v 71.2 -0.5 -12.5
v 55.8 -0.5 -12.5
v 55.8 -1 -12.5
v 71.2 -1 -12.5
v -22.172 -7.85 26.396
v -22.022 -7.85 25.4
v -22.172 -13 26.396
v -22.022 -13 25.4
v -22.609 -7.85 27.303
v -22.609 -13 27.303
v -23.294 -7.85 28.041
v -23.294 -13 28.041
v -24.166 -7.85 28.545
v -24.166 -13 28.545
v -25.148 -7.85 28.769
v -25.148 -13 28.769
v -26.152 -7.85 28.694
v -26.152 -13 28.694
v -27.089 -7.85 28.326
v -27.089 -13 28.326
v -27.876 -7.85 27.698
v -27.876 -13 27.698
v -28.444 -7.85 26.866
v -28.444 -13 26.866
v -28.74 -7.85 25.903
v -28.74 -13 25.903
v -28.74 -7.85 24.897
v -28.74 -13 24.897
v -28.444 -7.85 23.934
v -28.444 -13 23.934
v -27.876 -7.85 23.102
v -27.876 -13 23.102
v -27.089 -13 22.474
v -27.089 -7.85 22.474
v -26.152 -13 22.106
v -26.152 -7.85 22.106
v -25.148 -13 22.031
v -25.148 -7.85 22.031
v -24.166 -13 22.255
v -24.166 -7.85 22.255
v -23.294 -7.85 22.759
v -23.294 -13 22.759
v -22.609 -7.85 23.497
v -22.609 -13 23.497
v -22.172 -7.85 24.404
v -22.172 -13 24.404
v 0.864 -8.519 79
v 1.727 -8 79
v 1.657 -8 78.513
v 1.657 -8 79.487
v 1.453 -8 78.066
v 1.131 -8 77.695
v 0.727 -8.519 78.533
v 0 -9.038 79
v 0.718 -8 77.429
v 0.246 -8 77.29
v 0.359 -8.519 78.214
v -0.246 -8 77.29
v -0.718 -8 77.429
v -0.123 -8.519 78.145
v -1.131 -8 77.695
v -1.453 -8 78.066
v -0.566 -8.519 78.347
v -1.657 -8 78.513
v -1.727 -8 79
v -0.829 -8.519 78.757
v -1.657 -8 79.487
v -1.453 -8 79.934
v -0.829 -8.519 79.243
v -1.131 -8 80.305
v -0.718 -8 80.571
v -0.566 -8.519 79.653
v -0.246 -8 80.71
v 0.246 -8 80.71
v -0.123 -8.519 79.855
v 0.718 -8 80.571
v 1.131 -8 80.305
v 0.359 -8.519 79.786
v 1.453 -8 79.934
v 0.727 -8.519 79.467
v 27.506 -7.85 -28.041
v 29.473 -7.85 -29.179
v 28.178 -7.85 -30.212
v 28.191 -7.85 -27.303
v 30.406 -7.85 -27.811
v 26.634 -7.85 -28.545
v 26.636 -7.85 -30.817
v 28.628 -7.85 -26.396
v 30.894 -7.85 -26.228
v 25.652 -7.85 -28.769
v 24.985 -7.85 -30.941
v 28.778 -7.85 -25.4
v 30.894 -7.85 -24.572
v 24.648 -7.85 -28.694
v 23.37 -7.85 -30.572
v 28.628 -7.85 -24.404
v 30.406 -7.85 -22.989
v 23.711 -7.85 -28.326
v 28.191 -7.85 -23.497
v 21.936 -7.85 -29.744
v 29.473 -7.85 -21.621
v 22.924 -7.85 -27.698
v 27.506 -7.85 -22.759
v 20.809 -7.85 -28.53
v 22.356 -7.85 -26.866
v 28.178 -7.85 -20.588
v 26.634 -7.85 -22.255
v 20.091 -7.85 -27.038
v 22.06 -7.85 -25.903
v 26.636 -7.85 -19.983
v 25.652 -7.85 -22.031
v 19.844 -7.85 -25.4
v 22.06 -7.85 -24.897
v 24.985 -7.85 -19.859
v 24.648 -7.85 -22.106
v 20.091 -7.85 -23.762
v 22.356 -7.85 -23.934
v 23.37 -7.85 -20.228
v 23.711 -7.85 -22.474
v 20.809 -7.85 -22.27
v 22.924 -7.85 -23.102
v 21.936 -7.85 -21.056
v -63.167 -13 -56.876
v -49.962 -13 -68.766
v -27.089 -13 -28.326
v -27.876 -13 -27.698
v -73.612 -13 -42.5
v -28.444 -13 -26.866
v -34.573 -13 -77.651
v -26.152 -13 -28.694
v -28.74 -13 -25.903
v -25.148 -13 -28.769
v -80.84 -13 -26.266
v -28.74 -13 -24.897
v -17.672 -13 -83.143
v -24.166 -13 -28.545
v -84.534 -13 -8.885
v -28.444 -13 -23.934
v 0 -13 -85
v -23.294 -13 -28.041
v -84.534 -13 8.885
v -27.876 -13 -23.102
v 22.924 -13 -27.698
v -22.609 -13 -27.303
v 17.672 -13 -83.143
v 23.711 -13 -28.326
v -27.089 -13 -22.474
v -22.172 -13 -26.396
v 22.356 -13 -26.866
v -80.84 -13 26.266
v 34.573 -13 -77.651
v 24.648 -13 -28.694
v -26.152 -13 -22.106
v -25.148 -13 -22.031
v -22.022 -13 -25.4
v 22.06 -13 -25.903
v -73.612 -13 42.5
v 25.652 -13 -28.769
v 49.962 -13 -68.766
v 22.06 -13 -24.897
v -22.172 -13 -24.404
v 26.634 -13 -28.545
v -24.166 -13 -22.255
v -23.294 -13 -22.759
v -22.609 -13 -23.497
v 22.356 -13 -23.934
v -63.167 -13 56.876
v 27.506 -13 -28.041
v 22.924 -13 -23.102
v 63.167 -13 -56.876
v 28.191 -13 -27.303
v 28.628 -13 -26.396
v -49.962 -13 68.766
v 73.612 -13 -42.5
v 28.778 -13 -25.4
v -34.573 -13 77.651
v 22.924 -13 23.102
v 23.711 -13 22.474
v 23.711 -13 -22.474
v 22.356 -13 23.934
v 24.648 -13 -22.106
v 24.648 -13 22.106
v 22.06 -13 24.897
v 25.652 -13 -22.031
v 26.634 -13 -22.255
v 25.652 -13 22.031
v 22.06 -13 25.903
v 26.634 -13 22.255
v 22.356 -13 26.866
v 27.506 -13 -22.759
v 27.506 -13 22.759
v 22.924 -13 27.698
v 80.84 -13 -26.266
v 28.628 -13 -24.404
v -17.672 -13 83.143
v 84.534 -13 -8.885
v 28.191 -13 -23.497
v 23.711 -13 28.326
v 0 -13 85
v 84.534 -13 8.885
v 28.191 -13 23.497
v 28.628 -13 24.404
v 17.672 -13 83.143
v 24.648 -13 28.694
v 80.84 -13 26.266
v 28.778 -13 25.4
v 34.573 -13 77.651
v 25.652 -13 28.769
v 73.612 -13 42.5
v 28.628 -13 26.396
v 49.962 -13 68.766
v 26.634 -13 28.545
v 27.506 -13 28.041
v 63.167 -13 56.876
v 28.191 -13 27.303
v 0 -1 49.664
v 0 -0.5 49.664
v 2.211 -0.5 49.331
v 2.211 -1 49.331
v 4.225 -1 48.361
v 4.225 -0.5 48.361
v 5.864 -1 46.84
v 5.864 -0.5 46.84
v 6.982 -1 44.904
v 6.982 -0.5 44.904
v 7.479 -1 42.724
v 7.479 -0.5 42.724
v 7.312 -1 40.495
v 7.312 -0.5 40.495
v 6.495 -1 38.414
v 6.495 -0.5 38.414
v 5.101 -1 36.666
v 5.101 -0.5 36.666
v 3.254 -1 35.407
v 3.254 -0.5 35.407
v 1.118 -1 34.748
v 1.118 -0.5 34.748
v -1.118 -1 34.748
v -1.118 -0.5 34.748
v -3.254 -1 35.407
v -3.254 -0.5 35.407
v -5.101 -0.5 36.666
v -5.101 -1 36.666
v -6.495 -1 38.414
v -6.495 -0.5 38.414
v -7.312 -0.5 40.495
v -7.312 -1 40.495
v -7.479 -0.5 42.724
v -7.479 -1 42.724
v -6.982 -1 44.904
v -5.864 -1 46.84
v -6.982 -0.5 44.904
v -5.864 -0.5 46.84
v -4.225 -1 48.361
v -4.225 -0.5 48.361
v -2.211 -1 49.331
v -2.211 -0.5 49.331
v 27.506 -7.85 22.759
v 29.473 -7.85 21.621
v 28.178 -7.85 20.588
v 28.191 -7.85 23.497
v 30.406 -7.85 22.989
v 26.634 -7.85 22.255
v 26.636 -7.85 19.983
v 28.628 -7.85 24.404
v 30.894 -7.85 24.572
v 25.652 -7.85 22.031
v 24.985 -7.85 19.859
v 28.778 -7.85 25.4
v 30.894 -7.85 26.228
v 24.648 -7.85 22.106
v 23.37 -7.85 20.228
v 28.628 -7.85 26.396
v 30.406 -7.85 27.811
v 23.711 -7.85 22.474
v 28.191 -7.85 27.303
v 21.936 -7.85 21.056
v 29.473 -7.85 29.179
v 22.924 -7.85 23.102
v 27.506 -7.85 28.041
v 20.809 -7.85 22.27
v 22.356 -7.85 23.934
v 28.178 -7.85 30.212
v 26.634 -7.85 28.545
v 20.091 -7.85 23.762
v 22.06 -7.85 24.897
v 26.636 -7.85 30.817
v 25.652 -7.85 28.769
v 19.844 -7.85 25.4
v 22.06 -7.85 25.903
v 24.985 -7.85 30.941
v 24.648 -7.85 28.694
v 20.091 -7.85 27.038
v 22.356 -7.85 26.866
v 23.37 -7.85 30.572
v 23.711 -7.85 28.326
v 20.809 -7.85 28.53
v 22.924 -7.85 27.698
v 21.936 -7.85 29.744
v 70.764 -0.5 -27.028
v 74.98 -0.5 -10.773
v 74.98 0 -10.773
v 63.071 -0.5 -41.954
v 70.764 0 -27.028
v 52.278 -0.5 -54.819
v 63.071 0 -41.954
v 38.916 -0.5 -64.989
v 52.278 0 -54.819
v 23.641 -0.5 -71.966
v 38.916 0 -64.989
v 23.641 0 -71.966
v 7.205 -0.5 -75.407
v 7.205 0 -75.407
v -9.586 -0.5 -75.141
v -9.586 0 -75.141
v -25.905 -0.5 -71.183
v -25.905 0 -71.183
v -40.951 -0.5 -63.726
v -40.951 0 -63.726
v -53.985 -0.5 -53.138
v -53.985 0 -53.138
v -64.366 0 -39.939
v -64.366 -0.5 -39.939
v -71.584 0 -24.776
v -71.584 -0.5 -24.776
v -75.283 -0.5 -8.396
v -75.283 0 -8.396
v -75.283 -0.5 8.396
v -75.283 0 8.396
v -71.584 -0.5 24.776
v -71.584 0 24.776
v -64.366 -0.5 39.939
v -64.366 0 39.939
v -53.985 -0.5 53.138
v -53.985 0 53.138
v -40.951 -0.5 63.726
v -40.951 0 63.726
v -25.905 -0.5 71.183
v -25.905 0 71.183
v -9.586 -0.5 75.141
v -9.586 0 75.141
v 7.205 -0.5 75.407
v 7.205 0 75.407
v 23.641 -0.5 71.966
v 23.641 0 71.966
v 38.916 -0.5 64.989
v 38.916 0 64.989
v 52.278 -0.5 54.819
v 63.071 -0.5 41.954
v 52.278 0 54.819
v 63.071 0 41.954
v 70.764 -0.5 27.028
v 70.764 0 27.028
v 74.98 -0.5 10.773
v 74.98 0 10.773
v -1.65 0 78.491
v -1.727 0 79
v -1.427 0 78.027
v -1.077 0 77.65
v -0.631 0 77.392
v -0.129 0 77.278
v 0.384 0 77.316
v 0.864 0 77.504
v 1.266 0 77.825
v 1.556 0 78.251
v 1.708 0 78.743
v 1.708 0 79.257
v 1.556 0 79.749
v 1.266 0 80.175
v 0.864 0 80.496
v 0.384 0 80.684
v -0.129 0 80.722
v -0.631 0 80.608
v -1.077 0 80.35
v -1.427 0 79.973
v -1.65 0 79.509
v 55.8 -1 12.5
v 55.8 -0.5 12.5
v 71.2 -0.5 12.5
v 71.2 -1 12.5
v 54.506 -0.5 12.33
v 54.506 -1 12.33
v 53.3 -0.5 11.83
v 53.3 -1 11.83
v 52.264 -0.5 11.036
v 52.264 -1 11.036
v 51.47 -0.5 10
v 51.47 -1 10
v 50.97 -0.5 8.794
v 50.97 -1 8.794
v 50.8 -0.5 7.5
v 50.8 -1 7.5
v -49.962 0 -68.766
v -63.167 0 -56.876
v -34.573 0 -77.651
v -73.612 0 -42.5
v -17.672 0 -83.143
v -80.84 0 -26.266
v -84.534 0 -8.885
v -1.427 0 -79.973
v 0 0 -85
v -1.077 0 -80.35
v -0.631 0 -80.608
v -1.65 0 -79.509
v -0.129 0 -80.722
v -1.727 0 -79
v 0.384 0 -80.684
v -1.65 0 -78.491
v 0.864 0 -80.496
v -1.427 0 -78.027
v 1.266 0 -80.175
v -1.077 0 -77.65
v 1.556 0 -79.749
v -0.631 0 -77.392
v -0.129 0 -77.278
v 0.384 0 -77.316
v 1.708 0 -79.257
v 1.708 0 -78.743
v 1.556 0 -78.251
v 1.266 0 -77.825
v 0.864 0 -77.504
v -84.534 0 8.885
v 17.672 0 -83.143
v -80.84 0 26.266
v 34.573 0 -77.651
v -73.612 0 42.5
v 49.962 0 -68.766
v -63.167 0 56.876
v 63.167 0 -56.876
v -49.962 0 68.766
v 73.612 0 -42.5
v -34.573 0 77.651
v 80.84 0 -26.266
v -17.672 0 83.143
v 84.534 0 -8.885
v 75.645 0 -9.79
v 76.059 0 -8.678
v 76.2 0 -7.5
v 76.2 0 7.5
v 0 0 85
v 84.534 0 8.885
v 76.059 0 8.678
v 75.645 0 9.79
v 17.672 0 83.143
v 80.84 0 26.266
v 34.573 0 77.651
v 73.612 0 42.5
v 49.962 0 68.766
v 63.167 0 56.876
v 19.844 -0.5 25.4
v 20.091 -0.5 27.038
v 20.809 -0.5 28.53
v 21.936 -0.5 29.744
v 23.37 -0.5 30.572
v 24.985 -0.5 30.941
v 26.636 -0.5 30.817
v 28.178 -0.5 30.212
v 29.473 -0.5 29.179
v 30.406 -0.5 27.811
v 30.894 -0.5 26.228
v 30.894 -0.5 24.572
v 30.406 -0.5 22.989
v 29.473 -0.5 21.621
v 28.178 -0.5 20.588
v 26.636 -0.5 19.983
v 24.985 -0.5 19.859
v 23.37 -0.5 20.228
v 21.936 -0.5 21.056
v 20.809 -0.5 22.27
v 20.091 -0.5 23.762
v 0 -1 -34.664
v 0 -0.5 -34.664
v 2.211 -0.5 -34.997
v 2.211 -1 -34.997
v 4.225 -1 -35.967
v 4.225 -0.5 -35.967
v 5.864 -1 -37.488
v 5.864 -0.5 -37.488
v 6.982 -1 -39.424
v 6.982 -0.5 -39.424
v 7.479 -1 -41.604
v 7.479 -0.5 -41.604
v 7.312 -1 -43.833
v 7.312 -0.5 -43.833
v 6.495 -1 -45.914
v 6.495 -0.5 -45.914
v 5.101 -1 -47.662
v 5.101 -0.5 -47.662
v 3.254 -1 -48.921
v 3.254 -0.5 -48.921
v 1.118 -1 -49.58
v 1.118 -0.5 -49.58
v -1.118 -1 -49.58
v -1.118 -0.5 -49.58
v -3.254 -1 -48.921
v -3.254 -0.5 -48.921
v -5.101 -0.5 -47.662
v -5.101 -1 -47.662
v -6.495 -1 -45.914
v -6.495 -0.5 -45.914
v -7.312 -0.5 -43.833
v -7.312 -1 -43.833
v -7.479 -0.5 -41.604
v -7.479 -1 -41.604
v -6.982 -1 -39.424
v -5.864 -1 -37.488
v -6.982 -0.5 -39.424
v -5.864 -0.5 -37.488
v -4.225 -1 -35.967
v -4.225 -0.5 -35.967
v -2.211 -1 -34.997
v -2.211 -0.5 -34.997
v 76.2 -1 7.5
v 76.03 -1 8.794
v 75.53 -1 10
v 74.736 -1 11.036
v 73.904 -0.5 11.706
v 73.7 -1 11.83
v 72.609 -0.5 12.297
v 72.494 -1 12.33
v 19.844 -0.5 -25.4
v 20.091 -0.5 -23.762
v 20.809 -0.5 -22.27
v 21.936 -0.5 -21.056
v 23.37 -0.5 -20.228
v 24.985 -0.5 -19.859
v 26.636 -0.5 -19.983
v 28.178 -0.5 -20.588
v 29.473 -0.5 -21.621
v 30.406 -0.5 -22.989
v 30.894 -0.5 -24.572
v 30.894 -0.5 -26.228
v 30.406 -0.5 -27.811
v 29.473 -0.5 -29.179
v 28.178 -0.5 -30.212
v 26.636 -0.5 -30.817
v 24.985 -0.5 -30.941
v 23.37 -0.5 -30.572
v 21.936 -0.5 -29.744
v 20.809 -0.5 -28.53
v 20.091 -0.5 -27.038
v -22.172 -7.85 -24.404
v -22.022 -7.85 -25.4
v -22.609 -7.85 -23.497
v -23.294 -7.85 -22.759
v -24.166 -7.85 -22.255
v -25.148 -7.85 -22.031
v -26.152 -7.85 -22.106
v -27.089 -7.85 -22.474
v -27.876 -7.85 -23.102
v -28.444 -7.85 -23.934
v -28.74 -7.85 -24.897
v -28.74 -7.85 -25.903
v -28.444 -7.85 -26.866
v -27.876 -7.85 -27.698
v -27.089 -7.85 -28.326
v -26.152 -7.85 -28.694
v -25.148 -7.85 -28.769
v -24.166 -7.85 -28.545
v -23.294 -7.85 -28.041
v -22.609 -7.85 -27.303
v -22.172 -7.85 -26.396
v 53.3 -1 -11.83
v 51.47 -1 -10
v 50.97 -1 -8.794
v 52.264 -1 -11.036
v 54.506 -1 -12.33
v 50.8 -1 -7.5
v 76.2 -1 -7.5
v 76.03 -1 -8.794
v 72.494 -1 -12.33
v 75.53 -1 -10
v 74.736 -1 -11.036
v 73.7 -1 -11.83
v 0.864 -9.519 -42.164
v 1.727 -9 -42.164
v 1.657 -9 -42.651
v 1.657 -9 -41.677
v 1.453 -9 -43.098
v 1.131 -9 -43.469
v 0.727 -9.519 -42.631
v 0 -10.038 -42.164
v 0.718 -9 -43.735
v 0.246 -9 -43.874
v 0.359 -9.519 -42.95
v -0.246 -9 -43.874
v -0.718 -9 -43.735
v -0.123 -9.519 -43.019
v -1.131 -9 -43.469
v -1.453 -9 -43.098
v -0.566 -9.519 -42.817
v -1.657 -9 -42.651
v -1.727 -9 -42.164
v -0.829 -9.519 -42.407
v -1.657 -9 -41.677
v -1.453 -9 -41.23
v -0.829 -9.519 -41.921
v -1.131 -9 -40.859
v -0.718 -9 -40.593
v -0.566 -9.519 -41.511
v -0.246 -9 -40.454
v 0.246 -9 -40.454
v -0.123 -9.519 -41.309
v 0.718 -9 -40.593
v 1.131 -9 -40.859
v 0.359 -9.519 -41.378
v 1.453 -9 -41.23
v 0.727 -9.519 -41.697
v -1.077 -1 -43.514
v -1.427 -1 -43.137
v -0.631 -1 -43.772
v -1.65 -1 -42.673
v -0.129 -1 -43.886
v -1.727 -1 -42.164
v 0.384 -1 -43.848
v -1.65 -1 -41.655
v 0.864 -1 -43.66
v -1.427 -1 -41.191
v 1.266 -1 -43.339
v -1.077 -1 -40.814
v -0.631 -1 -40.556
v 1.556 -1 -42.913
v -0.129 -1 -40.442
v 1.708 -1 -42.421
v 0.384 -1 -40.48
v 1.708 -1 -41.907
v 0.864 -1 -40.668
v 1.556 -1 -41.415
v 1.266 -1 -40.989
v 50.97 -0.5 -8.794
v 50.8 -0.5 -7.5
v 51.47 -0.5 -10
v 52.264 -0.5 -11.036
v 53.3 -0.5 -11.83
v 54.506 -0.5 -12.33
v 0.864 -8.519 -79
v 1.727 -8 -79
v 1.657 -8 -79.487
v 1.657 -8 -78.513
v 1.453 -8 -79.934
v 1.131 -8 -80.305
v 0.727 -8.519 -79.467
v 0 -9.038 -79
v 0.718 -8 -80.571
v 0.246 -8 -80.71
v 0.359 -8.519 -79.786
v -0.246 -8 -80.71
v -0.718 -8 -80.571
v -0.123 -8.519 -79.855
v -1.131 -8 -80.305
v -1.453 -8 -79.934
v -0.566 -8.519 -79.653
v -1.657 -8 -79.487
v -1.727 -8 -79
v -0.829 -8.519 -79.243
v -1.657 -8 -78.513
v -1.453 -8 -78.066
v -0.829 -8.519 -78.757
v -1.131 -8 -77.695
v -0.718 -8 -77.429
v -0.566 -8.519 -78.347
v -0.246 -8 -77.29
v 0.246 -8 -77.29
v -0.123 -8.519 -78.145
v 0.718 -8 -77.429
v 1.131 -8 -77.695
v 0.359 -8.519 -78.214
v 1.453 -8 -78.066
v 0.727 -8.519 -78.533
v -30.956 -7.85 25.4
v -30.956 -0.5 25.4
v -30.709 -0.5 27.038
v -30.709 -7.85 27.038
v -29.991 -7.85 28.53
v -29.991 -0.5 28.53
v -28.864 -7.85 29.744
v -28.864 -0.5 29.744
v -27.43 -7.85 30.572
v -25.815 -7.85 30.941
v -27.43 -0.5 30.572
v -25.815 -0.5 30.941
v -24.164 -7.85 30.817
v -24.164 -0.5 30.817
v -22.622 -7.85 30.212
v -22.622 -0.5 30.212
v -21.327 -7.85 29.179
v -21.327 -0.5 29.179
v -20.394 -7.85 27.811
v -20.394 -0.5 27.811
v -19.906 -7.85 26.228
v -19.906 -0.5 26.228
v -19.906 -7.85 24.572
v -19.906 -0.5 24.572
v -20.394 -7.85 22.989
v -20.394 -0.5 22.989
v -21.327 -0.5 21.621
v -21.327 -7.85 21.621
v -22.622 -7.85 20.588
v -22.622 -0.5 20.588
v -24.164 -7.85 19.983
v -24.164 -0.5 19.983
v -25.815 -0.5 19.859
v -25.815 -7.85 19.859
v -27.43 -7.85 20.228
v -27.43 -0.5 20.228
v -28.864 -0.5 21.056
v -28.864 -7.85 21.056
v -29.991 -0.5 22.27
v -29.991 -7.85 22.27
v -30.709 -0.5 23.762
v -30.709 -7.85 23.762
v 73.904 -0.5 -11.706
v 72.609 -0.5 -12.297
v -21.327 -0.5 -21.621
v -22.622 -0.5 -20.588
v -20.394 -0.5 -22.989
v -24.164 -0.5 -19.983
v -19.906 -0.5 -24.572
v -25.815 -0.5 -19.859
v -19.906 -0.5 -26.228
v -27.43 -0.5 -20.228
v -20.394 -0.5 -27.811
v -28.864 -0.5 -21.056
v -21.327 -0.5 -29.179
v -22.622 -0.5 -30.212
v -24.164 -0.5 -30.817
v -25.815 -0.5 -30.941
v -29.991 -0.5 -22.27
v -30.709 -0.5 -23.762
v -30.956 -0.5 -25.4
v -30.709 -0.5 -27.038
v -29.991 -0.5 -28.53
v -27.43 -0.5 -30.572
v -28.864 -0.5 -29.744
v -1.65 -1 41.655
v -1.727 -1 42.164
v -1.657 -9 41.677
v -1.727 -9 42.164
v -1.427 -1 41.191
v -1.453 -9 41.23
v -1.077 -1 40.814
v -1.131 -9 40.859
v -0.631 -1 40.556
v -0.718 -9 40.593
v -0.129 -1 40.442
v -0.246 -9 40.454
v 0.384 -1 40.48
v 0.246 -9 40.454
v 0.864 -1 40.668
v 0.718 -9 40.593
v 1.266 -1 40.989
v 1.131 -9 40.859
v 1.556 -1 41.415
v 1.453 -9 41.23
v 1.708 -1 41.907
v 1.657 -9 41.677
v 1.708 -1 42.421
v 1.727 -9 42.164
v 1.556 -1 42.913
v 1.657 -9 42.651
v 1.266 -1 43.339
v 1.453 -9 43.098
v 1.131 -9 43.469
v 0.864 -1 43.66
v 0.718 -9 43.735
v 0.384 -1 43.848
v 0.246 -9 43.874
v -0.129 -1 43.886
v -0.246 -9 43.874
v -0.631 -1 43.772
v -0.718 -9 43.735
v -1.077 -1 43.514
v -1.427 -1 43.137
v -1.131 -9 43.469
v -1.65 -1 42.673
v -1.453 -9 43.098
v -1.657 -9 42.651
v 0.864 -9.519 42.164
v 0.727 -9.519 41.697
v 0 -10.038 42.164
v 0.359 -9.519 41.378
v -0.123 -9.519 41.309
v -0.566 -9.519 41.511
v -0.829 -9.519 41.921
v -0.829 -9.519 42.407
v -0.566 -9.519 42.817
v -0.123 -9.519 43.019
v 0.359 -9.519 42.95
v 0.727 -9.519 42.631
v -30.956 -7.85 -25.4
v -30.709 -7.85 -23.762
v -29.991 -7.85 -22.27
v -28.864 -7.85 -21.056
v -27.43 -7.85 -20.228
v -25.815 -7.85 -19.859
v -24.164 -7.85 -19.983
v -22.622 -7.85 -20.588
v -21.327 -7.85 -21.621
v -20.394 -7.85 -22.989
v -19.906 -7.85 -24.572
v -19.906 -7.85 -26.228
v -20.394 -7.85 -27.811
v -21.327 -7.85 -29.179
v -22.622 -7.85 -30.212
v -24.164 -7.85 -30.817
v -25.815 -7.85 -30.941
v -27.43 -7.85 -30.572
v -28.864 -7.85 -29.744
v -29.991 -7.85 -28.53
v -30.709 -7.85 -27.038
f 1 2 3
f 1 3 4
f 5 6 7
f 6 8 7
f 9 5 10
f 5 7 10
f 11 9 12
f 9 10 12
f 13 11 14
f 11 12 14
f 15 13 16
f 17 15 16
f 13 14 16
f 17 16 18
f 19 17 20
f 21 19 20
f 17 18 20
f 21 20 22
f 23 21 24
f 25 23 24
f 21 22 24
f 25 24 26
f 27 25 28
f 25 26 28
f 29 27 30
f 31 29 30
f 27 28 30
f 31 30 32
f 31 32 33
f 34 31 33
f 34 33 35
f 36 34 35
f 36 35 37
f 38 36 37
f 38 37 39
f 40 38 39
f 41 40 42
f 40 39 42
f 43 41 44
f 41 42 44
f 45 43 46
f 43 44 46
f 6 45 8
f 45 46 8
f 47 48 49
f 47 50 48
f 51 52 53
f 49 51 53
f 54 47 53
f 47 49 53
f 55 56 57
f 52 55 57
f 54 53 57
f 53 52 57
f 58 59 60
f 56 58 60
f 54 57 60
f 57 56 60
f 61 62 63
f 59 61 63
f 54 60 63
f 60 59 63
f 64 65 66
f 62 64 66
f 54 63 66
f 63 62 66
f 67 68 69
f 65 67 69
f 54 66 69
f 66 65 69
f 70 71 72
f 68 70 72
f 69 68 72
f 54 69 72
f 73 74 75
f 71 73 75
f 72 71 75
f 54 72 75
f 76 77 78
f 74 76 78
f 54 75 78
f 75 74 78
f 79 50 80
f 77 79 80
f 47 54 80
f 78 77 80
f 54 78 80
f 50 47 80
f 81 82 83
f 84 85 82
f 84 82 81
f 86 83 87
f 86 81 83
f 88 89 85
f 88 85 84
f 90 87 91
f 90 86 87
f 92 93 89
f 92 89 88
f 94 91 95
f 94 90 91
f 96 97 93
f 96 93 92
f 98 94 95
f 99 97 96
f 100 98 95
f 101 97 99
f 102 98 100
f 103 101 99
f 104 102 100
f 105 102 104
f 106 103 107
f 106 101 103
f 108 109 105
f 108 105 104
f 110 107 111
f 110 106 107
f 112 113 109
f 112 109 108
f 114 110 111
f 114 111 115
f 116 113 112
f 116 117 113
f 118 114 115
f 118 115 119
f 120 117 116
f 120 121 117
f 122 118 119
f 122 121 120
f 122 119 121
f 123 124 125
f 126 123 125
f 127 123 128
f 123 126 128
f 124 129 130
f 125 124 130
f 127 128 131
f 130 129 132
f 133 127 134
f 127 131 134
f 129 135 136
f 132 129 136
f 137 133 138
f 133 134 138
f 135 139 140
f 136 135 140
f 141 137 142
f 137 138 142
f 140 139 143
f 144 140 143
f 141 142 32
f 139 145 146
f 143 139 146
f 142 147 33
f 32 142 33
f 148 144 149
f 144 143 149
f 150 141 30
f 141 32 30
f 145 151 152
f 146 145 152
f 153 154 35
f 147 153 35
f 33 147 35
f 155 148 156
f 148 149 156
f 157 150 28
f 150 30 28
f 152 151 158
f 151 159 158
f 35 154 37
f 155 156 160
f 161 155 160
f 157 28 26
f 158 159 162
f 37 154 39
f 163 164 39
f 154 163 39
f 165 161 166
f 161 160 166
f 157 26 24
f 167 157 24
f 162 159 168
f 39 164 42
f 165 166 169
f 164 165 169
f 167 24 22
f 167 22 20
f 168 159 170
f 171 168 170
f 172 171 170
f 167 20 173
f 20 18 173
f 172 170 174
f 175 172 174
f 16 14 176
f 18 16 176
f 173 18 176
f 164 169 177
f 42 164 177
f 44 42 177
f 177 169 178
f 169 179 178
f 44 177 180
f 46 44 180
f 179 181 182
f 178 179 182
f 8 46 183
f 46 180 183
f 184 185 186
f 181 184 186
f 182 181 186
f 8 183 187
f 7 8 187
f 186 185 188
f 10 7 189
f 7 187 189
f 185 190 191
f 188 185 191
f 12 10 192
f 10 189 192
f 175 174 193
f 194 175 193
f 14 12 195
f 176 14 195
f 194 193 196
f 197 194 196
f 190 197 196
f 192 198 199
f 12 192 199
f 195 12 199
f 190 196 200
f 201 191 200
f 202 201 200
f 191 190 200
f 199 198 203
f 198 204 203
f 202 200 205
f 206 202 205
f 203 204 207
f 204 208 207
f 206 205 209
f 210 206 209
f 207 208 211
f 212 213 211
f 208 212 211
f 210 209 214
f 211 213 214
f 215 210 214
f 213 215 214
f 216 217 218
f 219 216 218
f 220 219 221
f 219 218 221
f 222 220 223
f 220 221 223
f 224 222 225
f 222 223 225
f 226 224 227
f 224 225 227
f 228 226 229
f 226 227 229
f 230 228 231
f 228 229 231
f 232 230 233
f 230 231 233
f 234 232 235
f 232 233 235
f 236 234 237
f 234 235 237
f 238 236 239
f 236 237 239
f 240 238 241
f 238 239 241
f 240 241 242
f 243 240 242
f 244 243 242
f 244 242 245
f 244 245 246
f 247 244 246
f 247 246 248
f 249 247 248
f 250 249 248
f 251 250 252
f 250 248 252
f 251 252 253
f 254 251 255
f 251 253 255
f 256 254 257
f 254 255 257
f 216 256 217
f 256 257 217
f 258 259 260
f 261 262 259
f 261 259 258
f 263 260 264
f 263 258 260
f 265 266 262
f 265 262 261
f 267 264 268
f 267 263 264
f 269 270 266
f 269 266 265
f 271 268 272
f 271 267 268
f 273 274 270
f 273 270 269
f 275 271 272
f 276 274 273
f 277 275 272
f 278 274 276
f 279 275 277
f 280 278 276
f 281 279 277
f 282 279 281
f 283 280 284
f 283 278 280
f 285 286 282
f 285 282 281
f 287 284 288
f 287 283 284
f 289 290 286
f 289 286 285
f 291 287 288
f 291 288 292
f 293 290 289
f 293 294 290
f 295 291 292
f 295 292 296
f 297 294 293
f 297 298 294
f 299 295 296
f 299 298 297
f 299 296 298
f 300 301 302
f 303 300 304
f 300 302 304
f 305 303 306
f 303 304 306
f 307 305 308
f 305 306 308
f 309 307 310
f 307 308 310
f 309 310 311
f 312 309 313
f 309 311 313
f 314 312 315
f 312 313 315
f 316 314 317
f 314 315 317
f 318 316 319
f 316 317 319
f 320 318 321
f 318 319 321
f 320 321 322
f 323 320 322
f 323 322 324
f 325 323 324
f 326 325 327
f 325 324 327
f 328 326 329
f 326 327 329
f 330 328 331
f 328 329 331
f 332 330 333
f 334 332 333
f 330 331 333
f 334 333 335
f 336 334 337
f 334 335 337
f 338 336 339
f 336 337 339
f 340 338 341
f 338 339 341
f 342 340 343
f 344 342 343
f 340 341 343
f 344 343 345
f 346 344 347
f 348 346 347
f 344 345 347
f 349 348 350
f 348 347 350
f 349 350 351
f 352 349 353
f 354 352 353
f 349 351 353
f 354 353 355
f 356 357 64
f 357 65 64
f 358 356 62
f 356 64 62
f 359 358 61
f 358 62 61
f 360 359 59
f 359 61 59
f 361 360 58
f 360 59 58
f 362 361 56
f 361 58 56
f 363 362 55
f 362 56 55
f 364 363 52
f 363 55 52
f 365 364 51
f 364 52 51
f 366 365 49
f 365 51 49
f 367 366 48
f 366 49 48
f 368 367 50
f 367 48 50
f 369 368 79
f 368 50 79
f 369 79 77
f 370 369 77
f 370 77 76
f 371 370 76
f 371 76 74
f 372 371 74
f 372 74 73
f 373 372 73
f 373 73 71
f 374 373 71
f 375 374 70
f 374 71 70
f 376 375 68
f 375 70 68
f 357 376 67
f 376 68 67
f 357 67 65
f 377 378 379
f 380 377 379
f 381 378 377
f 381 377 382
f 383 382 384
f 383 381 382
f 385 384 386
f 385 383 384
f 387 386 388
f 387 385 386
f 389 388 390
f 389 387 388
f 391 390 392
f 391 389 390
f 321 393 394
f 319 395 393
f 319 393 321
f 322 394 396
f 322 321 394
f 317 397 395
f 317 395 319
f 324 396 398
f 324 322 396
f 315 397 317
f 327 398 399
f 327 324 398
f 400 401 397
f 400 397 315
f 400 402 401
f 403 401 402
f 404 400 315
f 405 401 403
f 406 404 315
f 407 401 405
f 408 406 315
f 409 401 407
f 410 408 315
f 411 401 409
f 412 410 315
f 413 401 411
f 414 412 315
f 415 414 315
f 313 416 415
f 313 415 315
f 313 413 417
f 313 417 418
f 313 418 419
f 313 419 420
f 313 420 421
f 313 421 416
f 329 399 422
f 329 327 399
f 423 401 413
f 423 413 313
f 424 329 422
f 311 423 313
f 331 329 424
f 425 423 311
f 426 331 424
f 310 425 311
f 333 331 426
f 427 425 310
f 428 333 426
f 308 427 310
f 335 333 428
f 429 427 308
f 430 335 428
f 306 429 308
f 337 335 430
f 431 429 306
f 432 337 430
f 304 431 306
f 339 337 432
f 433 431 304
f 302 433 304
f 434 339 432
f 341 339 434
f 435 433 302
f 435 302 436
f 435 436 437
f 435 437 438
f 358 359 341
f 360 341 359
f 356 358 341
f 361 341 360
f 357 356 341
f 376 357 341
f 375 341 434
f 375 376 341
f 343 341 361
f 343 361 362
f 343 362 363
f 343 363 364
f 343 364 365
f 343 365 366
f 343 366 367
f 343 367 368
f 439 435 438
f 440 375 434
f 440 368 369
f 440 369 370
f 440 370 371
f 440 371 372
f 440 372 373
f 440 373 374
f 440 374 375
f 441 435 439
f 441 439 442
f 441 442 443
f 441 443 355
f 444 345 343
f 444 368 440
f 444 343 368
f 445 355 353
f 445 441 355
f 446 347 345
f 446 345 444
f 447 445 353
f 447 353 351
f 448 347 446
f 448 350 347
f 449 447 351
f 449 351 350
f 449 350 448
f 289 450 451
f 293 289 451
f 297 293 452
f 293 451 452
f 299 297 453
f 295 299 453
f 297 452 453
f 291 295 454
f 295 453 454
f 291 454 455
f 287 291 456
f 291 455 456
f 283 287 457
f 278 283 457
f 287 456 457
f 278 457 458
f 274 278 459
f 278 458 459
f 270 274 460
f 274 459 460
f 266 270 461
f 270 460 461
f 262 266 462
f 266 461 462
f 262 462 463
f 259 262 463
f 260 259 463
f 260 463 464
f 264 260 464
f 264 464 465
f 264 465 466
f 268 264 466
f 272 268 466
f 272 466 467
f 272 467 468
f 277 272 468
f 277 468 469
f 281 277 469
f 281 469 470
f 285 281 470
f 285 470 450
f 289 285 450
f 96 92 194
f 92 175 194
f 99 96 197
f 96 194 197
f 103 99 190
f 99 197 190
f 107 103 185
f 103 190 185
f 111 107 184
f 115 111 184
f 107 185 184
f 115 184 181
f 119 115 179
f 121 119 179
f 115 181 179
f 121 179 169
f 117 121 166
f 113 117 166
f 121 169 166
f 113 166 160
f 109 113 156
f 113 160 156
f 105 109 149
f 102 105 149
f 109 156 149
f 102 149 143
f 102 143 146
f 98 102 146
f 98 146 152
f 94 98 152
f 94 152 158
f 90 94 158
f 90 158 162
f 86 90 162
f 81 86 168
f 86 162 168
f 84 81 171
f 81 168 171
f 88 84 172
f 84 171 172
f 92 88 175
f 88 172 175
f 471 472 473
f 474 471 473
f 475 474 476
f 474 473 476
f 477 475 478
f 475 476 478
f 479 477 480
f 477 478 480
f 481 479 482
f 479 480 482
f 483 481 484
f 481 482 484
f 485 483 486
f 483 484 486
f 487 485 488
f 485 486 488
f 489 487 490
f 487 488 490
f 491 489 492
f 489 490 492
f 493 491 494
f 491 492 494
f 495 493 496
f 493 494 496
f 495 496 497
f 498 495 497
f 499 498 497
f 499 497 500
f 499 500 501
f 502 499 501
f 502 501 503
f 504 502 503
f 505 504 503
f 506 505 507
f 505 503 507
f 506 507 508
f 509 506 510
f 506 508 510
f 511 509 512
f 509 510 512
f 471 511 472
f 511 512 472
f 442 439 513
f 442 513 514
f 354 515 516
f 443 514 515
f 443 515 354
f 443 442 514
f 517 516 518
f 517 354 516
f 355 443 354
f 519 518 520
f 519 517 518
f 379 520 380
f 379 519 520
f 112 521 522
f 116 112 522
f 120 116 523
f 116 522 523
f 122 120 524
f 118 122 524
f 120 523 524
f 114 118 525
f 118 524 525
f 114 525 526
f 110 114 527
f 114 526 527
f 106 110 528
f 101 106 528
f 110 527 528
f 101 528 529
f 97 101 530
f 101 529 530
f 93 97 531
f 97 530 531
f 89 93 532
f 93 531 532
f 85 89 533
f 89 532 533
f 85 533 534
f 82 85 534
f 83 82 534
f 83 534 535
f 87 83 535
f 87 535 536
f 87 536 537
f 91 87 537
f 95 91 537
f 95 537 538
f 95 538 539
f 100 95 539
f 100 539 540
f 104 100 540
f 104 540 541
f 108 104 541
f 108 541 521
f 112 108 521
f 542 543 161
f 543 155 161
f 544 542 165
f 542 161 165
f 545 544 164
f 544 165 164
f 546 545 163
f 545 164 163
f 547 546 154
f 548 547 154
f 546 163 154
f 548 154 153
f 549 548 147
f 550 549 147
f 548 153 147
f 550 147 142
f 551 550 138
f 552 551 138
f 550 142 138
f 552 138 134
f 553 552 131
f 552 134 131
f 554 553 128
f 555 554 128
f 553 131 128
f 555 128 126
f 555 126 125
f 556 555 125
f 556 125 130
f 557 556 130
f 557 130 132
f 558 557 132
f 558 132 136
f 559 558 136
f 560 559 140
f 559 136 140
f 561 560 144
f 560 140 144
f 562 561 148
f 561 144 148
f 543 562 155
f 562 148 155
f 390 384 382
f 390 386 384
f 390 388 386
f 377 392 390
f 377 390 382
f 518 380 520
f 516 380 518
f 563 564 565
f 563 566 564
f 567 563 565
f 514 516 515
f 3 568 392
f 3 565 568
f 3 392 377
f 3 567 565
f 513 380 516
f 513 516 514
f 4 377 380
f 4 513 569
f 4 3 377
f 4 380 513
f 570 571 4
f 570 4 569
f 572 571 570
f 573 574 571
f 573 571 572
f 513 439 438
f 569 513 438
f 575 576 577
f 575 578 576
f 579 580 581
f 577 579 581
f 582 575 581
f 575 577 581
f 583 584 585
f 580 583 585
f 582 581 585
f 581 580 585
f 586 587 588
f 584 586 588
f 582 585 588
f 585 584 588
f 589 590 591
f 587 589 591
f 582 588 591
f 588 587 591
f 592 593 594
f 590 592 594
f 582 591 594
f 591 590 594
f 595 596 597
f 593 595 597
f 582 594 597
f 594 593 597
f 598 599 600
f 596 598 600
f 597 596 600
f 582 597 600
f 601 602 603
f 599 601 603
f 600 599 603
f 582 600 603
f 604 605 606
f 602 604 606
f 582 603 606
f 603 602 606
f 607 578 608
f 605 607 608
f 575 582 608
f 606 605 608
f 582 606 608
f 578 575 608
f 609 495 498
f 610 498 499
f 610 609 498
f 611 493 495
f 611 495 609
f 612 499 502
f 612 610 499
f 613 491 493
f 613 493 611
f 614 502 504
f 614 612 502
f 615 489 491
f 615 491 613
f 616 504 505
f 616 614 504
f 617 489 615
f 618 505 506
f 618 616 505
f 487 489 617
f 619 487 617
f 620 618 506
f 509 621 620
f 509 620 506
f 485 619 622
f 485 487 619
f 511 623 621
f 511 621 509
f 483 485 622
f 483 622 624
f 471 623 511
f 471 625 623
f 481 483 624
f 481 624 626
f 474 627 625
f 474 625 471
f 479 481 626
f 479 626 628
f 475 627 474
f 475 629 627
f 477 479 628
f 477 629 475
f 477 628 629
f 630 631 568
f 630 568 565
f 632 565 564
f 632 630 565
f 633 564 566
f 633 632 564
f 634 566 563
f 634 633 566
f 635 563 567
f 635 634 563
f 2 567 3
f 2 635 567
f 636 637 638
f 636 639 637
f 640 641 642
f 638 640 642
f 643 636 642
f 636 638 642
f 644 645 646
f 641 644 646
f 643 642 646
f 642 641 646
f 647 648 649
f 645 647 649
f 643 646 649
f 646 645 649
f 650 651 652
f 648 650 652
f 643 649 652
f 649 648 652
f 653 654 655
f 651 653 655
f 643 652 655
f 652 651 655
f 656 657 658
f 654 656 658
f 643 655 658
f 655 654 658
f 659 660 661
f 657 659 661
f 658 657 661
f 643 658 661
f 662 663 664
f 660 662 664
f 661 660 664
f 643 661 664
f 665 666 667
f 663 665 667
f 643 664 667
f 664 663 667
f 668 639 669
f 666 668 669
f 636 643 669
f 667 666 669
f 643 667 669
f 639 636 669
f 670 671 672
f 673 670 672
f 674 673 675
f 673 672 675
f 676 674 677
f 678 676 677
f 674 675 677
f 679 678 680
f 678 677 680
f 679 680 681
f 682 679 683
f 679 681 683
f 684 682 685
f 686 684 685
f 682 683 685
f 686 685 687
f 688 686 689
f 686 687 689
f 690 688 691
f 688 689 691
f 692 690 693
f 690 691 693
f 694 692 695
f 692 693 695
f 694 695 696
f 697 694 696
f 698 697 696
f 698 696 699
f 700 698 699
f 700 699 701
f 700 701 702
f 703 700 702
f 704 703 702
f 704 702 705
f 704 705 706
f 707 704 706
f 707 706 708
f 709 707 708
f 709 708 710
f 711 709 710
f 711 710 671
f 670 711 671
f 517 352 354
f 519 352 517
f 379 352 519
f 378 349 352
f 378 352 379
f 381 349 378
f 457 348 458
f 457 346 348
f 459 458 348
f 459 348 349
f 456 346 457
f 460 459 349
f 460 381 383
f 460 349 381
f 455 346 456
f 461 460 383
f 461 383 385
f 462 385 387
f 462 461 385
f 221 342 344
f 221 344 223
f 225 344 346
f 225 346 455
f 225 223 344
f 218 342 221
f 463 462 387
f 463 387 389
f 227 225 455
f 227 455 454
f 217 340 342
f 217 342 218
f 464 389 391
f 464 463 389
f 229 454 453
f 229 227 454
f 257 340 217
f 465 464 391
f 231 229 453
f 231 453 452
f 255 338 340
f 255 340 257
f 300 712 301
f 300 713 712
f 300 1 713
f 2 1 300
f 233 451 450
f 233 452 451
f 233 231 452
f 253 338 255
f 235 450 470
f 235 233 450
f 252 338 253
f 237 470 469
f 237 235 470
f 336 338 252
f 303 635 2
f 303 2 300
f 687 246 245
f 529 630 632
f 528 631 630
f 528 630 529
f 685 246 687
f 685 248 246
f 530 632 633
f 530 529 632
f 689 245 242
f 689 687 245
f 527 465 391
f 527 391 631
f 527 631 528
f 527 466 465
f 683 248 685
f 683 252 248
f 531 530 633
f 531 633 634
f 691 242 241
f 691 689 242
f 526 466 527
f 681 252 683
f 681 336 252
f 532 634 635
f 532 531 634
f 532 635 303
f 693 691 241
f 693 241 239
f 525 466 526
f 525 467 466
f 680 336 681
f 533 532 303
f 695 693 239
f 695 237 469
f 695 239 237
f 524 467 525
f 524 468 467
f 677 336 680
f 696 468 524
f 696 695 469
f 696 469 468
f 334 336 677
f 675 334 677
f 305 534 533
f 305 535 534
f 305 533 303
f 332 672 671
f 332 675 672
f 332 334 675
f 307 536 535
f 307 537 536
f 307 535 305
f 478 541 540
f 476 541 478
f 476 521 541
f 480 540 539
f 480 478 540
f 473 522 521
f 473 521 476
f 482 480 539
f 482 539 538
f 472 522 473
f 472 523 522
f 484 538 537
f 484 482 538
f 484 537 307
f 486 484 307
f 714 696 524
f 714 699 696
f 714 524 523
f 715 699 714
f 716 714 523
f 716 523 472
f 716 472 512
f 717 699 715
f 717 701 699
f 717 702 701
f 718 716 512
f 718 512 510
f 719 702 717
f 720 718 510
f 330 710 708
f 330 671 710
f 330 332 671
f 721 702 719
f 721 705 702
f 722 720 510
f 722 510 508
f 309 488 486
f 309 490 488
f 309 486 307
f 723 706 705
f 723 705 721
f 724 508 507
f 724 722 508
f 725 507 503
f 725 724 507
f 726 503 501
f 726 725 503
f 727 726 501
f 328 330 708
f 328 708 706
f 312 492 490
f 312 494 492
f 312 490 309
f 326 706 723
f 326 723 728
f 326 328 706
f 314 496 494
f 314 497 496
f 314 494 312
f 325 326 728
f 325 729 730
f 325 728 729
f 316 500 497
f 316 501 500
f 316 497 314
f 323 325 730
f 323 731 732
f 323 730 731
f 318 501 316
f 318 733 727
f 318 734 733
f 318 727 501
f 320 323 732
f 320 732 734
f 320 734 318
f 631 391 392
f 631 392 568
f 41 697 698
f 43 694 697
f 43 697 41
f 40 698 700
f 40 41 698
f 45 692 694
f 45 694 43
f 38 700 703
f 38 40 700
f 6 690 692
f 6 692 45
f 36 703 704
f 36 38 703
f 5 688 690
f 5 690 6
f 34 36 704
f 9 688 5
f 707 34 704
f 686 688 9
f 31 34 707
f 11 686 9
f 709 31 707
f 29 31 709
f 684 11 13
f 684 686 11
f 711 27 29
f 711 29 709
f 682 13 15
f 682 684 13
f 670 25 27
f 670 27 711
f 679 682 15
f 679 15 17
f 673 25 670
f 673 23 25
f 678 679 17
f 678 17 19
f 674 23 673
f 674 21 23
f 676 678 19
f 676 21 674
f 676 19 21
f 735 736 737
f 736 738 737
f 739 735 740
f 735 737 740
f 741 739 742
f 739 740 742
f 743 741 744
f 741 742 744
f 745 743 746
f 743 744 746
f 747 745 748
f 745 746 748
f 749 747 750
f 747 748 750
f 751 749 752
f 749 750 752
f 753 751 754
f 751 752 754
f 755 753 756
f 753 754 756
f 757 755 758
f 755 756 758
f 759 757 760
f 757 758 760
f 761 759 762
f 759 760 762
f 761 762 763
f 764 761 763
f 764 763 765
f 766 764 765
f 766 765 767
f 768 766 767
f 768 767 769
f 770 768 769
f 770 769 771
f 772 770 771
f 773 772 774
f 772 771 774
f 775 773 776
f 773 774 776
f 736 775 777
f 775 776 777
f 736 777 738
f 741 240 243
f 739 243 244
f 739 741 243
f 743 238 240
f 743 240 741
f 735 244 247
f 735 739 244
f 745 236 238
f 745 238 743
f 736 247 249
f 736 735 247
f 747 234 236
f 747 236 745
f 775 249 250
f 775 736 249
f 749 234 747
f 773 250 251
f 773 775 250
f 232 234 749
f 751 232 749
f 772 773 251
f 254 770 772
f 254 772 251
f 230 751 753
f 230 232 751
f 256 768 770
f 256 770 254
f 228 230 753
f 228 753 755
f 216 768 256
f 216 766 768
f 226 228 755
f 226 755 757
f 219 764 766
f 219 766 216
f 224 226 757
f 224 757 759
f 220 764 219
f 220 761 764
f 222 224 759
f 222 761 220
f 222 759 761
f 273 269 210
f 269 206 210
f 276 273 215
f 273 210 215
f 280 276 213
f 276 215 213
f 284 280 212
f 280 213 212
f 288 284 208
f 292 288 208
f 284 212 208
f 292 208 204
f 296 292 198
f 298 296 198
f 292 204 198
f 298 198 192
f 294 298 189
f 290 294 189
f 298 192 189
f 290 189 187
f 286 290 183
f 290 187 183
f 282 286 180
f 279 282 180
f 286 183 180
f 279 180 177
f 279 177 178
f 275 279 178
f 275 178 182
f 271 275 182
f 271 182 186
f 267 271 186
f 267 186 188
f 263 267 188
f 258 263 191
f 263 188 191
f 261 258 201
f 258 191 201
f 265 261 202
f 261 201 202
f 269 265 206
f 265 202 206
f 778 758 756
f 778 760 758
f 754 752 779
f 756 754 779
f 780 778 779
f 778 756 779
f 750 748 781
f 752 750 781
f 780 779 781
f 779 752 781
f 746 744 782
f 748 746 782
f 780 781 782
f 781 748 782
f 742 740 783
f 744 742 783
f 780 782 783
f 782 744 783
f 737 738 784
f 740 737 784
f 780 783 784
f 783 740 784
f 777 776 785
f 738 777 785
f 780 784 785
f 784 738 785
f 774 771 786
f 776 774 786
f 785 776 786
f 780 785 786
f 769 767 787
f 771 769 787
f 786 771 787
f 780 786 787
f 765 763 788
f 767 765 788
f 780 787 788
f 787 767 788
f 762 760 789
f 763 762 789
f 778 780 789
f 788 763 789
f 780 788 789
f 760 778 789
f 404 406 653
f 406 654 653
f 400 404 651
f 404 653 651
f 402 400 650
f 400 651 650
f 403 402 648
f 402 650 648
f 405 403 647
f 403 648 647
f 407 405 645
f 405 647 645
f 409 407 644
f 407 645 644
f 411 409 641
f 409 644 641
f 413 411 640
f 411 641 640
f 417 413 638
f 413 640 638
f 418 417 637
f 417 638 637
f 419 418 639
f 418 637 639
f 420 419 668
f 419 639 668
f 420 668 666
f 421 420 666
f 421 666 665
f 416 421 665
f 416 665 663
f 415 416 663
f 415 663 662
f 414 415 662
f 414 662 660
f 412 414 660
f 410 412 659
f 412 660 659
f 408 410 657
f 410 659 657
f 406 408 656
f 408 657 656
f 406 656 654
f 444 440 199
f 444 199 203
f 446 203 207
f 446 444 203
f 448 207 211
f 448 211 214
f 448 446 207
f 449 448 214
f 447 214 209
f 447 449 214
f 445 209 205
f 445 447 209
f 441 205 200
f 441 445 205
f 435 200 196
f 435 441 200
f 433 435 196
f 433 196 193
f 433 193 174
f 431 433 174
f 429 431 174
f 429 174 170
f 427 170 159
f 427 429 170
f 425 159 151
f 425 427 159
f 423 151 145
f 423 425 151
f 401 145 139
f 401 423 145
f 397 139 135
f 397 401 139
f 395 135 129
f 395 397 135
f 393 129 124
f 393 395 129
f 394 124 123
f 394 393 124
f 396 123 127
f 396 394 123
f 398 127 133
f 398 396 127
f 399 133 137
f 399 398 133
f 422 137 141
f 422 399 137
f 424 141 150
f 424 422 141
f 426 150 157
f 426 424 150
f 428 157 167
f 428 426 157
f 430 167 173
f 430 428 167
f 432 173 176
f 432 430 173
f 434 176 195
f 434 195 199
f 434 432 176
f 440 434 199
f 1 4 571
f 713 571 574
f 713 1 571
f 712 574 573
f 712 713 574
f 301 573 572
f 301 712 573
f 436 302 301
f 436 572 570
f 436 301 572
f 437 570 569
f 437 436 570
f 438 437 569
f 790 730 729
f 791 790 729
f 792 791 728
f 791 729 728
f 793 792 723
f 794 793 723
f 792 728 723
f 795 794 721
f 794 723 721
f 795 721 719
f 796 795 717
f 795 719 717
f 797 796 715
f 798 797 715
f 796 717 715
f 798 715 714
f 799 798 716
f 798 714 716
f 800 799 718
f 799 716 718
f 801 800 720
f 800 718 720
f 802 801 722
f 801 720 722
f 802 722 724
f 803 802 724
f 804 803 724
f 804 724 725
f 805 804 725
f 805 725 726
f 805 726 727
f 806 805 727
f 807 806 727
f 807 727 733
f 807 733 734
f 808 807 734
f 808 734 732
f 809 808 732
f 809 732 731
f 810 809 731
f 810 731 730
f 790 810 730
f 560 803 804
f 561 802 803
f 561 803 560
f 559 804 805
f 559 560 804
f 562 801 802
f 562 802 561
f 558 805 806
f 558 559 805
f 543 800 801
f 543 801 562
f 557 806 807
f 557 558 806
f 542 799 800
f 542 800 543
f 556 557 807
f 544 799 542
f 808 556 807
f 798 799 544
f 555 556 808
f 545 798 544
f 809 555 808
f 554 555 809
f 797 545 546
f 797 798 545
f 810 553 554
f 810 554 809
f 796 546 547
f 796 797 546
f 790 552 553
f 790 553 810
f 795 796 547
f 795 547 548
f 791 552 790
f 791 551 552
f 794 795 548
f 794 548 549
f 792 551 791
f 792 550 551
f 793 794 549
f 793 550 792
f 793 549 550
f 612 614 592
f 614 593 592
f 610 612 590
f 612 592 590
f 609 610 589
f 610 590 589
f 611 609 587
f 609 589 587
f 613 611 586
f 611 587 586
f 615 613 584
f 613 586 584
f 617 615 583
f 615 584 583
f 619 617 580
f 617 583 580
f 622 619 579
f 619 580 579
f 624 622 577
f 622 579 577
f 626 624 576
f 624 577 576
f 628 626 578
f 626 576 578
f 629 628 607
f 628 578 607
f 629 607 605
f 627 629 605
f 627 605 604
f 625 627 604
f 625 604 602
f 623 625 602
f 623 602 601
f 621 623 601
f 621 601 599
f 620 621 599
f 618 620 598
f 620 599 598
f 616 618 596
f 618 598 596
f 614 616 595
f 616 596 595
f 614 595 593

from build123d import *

# Parameters (mm, degrees)
SKETCH1_R                                        = 85
BOSS_EXTRUDE1_DEPTH                              = 13
SKETCH2_R                                        = 75.75
CUT_EXTRUDE1_DEPTH                               = 0.5
CBORE_FOR_1_4_SOCKET_HEAD_CAP_SCREW1_D           = 6.7564
CBORE_FOR_1_4_SOCKET_HEAD_CAP_SCREW1_DEPTH       = 15
CBORE_FOR_1_4_SOCKET_HEAD_CAP_SCREW1_CBORE_D     = 11.1125
CBORE_FOR_1_4_SOCKET_HEAD_CAP_SCREW1_CBORE_DEPTH = 7.349998
CBORE_FOR_1_4_SOCKET_HEAD_CAP_SCREW1_TIP         = 2.029827343
F_8_32_TAPPED_HOLE1_D                            = 3.4544
F_8_32_TAPPED_HOLE1_DEPTH                        = 8
F_8_32_TAPPED_HOLE1_TIP                          = 1.037806461
SKETCH9_W                                        = 25.4
SKETCH9_H                                        = 25
WAFER_TWEEZER_SLOT_DEPTH                         = 1
FILLET1_R                                        = 5
SKETCH10_R                                       = 7.5
CUT_EXTRUDE2_DEPTH                               = 0.5
F_8_32_TAPPED_HOLE2_D                            = 3.4544
F_8_32_TAPPED_HOLE2_DEPTH                        = 8
F_8_32_TAPPED_HOLE2_TIP                          = 1.037806461


with BuildPart() as part:
    # Sketch1 → Boss-Extrude1 (new body)
    with BuildSketch(Plane(origin=(0, 0, 0), x_dir=(1, 0, 0), z_dir=(0, 1, 0))):
        with Locations(Location((0, 0, 0), (0, 0, 270))):
            Circle(SKETCH1_R)
    extrude(amount=-BOSS_EXTRUDE1_DEPTH)

    # Sketch2 → Cut-Extrude1 (cut)
    with BuildSketch(Plane(origin=(0, 0, 0), x_dir=(1, 0, 0), z_dir=(0, 1, 0))):
        with Locations(Location((0, 0, 0), (0, 0, 270))):
            Circle(SKETCH2_R)
    extrude(amount=-CUT_EXTRUDE1_DEPTH, mode=Mode.SUBTRACT)

    # CBORE for 1/4 Socket Head Cap Screw1
    with Locations(Plane(origin=(0, -0.5, 0), x_dir=(-1, 0, 0), z_dir=(0, 1, 0))):
        with Locations((25.4, 25.4), (-25.4, 25.4), (-25.4, -25.4), (25.4, -25.4)):
            CounterBoreHole(CBORE_FOR_1_4_SOCKET_HEAD_CAP_SCREW1_D / 2, CBORE_FOR_1_4_SOCKET_HEAD_CAP_SCREW1_CBORE_D / 2, CBORE_FOR_1_4_SOCKET_HEAD_CAP_SCREW1_CBORE_DEPTH, depth=CBORE_FOR_1_4_SOCKET_HEAD_CAP_SCREW1_DEPTH)
            with Locations((0, 0, -(CBORE_FOR_1_4_SOCKET_HEAD_CAP_SCREW1_DEPTH + CBORE_FOR_1_4_SOCKET_HEAD_CAP_SCREW1_TIP / 2))):  # 118° drill point
                Cone(0, CBORE_FOR_1_4_SOCKET_HEAD_CAP_SCREW1_D / 2, CBORE_FOR_1_4_SOCKET_HEAD_CAP_SCREW1_TIP, mode=Mode.SUBTRACT)

    # #8-32 Tapped Hole1
    with Locations(Plane(origin=(0, 0, 0), x_dir=(1, 0, 0), z_dir=(0, 1, 0))):
        with Locations((0, 79), (0, -79)):
            Hole(F_8_32_TAPPED_HOLE1_D / 2, depth=F_8_32_TAPPED_HOLE1_DEPTH)
            with Locations((0, 0, -(F_8_32_TAPPED_HOLE1_DEPTH + F_8_32_TAPPED_HOLE1_TIP / 2))):  # 118° drill point
                Cone(0, F_8_32_TAPPED_HOLE1_D / 2, F_8_32_TAPPED_HOLE1_TIP, mode=Mode.SUBTRACT)

    # Sketch9 → wafer_tweezer_slot (cut)
    with BuildSketch(Plane(origin=(0, 0, 0), x_dir=(1, 0, 0), z_dir=(0, 1, 0))):
        with Locations((63.5, 0)):
            Rectangle(SKETCH9_W, SKETCH9_H)
    extrude(amount=-WAFER_TWEEZER_SLOT_DEPTH, mode=Mode.SUBTRACT)

    # Fillet1
    # the kernel refuses this fillet: 5 mm, written as the material it adds along each edge
    with BuildSketch(Plane(origin=(76.2, 0, -12.5), x_dir=(0, 0, 1), z_dir=(0, -1, 0))) as fillet1_piece_1_section:
        with BuildLine():
            CenterArc((FILLET1_R, FILLET1_R), FILLET1_R, 180, 90)
            Line((0, FILLET1_R), (0, 0))
            Line((0, 0), (FILLET1_R, 0))
        make_face()
    fillet1_piece_1 = extrude(amount=1, mode=Mode.PRIVATE)
    fillet1_piece_1 = fillet1_piece_1 - Plane(origin=(0, -0.25, 0), x_dir=(0, 0, 1), z_dir=(0, 1, 0)) * Cylinder(75.75, 23, mode=Mode.PRIVATE)
    add(fillet1_piece_1)
    with BuildSketch(Plane(origin=(76.2, 12.5, -12.5), x_dir=(0, 0, 1), z_dir=(0, -1, 0))) as fillet1_piece_2_section:
        with BuildLine():
            CenterArc((FILLET1_R, FILLET1_R), FILLET1_R, 180, 90)
            Line((0, FILLET1_R), (0, 0))
            Line((0, 0), (FILLET1_R, 0))
        make_face()
    fillet1_piece_2 = extrude(amount=13.5, mode=Mode.PRIVATE)
    fillet1_piece_2 = split(fillet1_piece_2, bisect_by=Plane(origin=(73.966184718, -0.5, -12.010793602), z_dir=(0, -1, 0)), keep=Keep.TOP, mode=Mode.PRIVATE)
    add(fillet1_piece_2)
    with BuildSketch(Plane(origin=(76.2, 0, 12.5), x_dir=(0, 0, -1), z_dir=(0, -1, 0))) as fillet1_piece_3_section:
        with BuildLine():
            CenterArc((FILLET1_R, -FILLET1_R), FILLET1_R, 90, 90)
            Line((0, -FILLET1_R), (0, 0))
            Line((0, 0), (FILLET1_R, 0))
        make_face()
    fillet1_piece_3 = extrude(amount=1, mode=Mode.PRIVATE)
    fillet1_piece_3 = fillet1_piece_3 - Plane(origin=(0, -0.25, 0), x_dir=(0, 0, 1), z_dir=(0, 1, 0)) * Cylinder(75.75, 22, mode=Mode.PRIVATE)
    add(fillet1_piece_3)
    with BuildSketch(Plane(origin=(76.2, 12.5, 12.5), x_dir=(0, 0, -1), z_dir=(0, -1, 0))) as fillet1_piece_4_section:
        with BuildLine():
            CenterArc((FILLET1_R, -FILLET1_R), FILLET1_R, 90, 90)
            Line((0, -FILLET1_R), (0, 0))
            Line((0, 0), (FILLET1_R, 0))
        make_face()
    fillet1_piece_4 = extrude(amount=13.5, mode=Mode.PRIVATE)
    fillet1_piece_4 = split(fillet1_piece_4, bisect_by=Plane(origin=(73.966184718, -0.5, 12.010793602), z_dir=(0, -1, 0)), keep=Keep.TOP, mode=Mode.PRIVATE)
    add(fillet1_piece_4)
    with BuildSketch(Plane(origin=(50.8, -0.5, 12.5), x_dir=(0, 0, -1), z_dir=(0, -1, 0))) as fillet1_piece_5:
        with BuildLine():
            CenterArc((FILLET1_R, FILLET1_R), FILLET1_R, 180, 90)
            Line((0, FILLET1_R), (0, 0))
            Line((0, 0), (FILLET1_R, 0))
        make_face()
    extrude(amount=0.5)
    with BuildSketch(Plane(origin=(50.8, -0.5, -12.5), x_dir=(0, 0, 1), z_dir=(0, -1, 0))) as fillet1_piece_6:
        with BuildLine():
            CenterArc((FILLET1_R, -FILLET1_R), FILLET1_R, 90, 90)
            Line((0, -FILLET1_R), (0, 0))
            Line((0, 0), (FILLET1_R, 0))
        make_face()
    extrude(amount=0.5)

    # Sketch10 → Cut-Extrude2 (cut)
    with BuildSketch(Plane(origin=(0, -0.5, 0), x_dir=(1, 0, 0), z_dir=(0, 1, 0))):
        with Locations(Location((0, -42.164, 0), (0, 0, 270))):
            Circle(SKETCH10_R)
        with Locations(Location((0, 42.164, 0), (0, 0, 270))):
            Circle(SKETCH10_R)
    extrude(amount=-CUT_EXTRUDE2_DEPTH, mode=Mode.SUBTRACT)

    # #8-32 Tapped Hole2
    with Locations(Plane(origin=(0, -1, 0), x_dir=(1, 0, 0), z_dir=(0, 1, 0))):
        with Locations((0, 42.164), (0, -42.164)):
            Hole(F_8_32_TAPPED_HOLE2_D / 2, depth=F_8_32_TAPPED_HOLE2_DEPTH)
            with Locations((0, 0, -(F_8_32_TAPPED_HOLE2_DEPTH + F_8_32_TAPPED_HOLE2_TIP / 2))):  # 118° drill point
                Cone(0, F_8_32_TAPPED_HOLE2_D / 2, F_8_32_TAPPED_HOLE2_TIP, mode=Mode.SUBTRACT)


solid = part.part
